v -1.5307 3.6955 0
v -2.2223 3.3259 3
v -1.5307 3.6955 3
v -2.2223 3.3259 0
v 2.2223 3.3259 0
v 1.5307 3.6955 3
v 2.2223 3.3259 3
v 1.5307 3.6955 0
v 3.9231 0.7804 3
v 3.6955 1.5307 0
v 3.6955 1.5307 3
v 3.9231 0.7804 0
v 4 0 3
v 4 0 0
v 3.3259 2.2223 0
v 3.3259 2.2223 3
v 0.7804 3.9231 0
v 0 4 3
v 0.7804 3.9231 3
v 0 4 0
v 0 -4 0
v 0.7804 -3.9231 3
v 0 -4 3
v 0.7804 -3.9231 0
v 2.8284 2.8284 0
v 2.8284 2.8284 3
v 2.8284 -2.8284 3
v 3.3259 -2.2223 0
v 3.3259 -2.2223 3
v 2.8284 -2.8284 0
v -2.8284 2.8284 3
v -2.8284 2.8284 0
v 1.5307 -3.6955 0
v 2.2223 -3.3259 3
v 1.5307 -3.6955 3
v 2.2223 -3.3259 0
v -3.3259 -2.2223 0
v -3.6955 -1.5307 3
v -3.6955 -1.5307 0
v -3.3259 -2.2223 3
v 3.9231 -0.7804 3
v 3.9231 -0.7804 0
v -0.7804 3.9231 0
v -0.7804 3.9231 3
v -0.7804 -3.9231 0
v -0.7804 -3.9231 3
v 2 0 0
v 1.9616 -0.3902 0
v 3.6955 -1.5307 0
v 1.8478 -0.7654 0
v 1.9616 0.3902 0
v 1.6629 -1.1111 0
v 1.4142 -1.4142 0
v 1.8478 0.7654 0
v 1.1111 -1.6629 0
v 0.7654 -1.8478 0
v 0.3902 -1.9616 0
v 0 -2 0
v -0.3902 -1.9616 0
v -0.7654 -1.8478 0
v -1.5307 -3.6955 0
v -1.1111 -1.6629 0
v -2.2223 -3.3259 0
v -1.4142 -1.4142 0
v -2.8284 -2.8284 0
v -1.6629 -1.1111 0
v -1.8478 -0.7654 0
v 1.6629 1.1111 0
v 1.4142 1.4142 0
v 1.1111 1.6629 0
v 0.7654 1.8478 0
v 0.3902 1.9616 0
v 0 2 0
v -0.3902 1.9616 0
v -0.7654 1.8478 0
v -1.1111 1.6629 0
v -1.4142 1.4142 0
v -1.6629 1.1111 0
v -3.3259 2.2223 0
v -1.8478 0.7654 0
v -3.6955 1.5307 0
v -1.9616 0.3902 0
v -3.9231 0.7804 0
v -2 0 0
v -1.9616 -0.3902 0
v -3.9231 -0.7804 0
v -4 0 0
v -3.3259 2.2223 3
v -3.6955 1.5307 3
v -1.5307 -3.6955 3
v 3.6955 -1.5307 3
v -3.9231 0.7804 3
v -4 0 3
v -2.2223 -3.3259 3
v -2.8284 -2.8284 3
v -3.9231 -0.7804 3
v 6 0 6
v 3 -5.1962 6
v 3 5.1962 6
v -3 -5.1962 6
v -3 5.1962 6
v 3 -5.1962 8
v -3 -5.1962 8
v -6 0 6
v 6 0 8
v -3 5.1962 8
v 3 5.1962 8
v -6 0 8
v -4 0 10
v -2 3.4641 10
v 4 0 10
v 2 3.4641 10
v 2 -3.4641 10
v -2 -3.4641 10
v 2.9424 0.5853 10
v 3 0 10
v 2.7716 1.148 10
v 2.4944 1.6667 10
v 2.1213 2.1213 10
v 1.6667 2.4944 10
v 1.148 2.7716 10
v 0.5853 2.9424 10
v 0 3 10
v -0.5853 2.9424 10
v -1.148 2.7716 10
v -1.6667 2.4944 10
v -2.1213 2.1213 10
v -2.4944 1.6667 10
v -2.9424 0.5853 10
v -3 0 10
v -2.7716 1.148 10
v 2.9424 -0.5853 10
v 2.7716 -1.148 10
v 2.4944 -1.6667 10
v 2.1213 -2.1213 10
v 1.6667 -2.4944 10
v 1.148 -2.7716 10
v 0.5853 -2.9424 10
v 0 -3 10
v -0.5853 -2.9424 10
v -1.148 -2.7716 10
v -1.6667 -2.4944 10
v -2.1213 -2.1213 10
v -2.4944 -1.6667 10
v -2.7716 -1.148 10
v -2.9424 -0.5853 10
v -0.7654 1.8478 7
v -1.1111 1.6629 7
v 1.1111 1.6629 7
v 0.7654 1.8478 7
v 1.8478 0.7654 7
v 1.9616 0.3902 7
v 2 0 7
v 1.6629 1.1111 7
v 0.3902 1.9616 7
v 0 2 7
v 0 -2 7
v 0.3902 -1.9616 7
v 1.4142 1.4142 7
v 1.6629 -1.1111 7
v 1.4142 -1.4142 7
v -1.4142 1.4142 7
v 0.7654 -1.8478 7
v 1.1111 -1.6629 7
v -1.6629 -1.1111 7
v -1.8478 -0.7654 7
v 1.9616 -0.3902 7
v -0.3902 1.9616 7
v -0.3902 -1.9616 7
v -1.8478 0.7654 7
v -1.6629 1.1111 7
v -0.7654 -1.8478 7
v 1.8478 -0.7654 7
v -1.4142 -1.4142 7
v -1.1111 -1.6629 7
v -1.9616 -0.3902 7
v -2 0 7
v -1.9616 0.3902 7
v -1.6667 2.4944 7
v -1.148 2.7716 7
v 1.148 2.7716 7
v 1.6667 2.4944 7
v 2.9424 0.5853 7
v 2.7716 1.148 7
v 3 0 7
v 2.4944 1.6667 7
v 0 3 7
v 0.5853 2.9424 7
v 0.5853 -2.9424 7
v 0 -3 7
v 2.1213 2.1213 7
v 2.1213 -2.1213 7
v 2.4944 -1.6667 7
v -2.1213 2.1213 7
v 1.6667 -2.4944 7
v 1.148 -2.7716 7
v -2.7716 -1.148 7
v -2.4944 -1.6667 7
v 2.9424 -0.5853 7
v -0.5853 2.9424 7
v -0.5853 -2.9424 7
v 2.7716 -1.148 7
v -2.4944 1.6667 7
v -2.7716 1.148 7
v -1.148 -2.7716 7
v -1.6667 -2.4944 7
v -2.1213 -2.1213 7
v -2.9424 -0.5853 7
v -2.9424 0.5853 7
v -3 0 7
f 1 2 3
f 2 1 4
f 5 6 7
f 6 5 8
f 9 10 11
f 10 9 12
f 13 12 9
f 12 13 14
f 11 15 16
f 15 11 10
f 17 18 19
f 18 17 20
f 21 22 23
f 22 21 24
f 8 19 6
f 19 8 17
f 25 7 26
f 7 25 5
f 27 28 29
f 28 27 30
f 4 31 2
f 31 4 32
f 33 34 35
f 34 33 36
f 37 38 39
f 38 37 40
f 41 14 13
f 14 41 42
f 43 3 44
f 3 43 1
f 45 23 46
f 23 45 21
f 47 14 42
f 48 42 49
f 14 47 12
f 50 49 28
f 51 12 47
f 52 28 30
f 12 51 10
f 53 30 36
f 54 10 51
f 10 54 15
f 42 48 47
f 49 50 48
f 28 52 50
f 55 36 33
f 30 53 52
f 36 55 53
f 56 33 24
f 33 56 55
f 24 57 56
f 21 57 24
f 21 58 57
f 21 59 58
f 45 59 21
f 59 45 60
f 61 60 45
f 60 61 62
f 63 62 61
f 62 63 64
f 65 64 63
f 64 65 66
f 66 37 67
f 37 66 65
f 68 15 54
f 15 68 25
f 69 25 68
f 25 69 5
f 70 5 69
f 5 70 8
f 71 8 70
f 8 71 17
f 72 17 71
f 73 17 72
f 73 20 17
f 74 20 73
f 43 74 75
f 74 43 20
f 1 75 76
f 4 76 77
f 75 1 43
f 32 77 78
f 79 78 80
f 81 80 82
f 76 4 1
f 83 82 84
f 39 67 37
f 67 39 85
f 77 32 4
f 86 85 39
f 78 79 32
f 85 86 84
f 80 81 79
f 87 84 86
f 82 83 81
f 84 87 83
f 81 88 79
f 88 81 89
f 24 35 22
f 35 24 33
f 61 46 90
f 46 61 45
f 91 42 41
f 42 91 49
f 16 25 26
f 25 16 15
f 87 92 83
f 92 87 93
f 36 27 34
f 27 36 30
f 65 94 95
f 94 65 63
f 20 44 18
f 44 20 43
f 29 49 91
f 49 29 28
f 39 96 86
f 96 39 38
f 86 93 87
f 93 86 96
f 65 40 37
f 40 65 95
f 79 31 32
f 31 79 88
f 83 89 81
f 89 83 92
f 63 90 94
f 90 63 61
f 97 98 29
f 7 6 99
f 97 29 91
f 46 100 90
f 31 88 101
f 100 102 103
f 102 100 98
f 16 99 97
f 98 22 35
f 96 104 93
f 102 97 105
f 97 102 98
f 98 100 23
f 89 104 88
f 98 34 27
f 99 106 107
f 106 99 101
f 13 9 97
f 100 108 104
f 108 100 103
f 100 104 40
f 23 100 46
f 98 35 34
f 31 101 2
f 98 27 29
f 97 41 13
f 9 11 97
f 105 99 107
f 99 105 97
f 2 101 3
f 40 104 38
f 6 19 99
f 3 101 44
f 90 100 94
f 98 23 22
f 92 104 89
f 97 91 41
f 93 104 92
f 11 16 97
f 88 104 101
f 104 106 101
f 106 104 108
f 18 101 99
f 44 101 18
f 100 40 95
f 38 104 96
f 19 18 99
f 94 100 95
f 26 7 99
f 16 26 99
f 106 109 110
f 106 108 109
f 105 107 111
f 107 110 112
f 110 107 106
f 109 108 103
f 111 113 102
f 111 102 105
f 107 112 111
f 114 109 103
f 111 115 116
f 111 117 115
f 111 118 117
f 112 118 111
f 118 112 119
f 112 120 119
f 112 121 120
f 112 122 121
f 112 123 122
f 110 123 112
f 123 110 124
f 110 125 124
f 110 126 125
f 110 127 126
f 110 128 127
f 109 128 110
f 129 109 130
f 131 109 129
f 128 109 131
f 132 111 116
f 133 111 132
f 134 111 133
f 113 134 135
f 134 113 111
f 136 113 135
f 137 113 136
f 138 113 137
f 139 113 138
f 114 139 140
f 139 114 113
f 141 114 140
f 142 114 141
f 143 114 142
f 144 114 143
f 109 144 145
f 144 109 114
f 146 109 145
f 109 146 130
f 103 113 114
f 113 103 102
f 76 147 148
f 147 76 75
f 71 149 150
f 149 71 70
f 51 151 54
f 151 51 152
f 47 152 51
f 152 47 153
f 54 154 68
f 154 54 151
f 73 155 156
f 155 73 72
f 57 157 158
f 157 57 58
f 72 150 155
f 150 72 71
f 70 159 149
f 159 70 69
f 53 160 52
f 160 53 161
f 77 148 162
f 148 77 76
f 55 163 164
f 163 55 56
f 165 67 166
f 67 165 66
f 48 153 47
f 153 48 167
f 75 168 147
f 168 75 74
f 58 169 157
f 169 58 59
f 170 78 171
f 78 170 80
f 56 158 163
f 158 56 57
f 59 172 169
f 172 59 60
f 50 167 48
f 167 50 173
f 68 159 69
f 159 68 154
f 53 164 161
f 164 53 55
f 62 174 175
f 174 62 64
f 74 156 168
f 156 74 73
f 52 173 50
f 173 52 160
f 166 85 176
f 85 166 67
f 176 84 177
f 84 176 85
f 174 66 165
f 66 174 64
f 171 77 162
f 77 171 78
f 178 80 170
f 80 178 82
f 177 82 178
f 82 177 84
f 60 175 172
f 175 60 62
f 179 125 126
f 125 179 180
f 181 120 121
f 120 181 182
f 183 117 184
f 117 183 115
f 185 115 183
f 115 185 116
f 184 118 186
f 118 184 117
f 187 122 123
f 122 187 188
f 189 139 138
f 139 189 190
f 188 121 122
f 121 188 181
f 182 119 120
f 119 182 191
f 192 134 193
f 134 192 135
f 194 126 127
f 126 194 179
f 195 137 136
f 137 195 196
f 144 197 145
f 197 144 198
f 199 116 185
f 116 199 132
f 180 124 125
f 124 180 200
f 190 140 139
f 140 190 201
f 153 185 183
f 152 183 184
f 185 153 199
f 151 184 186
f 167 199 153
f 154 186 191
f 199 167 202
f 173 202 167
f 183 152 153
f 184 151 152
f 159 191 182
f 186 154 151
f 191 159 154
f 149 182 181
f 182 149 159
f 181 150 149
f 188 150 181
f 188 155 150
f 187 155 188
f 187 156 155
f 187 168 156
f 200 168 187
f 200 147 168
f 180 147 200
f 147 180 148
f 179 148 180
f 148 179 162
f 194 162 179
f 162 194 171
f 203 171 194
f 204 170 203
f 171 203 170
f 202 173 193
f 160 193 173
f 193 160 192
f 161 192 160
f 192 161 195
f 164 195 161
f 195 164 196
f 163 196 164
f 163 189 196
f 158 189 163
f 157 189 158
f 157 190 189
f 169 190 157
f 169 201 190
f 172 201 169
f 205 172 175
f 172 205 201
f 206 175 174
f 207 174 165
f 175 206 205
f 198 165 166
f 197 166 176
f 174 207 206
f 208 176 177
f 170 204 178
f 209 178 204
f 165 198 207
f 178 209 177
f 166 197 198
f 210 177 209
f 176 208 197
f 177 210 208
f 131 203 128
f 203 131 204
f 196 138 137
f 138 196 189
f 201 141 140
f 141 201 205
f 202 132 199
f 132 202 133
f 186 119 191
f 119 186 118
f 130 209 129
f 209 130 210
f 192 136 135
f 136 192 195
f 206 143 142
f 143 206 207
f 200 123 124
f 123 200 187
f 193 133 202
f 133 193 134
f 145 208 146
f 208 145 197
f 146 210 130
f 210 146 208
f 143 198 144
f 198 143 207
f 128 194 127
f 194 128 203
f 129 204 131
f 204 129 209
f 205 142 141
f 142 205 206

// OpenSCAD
epsilon = 0.01;

$fn = 32;

//rotate ([180, 0, 0])
screwgrip ();

module screwgrip ()
{
    difference ()
    {
        union ()
        {
            cylinder (d1 = 8, d2 = 8, h = 3);

            hull ()
            {
                translate ([0, 0, 3])
                cylinder (d1 = 8, d2 = 8, h = epsilon);
                
                translate ([0, 0, 6])
                cylinder (d = 12, h = 2, $fn = 6);
            }
            
            hull ()
            {
                translate ([0, 0, 6])
                cylinder (d = 12, h = 2, $fn = 6);
                
                translate ([0, 0, 8])
                cylinder (d = 8, h = 2, $fn = 6);
                
                
            }
        }
        
        epzstep (1)
        cylinder (d = 4, h = 10);
        
        translate ([0, 0, 7])
        cylinder (d = 6, h = 10);
        
    }
}

module epzstep (n)
{
    translate ([0, 0, -n * epsilon])
    children ();
}
